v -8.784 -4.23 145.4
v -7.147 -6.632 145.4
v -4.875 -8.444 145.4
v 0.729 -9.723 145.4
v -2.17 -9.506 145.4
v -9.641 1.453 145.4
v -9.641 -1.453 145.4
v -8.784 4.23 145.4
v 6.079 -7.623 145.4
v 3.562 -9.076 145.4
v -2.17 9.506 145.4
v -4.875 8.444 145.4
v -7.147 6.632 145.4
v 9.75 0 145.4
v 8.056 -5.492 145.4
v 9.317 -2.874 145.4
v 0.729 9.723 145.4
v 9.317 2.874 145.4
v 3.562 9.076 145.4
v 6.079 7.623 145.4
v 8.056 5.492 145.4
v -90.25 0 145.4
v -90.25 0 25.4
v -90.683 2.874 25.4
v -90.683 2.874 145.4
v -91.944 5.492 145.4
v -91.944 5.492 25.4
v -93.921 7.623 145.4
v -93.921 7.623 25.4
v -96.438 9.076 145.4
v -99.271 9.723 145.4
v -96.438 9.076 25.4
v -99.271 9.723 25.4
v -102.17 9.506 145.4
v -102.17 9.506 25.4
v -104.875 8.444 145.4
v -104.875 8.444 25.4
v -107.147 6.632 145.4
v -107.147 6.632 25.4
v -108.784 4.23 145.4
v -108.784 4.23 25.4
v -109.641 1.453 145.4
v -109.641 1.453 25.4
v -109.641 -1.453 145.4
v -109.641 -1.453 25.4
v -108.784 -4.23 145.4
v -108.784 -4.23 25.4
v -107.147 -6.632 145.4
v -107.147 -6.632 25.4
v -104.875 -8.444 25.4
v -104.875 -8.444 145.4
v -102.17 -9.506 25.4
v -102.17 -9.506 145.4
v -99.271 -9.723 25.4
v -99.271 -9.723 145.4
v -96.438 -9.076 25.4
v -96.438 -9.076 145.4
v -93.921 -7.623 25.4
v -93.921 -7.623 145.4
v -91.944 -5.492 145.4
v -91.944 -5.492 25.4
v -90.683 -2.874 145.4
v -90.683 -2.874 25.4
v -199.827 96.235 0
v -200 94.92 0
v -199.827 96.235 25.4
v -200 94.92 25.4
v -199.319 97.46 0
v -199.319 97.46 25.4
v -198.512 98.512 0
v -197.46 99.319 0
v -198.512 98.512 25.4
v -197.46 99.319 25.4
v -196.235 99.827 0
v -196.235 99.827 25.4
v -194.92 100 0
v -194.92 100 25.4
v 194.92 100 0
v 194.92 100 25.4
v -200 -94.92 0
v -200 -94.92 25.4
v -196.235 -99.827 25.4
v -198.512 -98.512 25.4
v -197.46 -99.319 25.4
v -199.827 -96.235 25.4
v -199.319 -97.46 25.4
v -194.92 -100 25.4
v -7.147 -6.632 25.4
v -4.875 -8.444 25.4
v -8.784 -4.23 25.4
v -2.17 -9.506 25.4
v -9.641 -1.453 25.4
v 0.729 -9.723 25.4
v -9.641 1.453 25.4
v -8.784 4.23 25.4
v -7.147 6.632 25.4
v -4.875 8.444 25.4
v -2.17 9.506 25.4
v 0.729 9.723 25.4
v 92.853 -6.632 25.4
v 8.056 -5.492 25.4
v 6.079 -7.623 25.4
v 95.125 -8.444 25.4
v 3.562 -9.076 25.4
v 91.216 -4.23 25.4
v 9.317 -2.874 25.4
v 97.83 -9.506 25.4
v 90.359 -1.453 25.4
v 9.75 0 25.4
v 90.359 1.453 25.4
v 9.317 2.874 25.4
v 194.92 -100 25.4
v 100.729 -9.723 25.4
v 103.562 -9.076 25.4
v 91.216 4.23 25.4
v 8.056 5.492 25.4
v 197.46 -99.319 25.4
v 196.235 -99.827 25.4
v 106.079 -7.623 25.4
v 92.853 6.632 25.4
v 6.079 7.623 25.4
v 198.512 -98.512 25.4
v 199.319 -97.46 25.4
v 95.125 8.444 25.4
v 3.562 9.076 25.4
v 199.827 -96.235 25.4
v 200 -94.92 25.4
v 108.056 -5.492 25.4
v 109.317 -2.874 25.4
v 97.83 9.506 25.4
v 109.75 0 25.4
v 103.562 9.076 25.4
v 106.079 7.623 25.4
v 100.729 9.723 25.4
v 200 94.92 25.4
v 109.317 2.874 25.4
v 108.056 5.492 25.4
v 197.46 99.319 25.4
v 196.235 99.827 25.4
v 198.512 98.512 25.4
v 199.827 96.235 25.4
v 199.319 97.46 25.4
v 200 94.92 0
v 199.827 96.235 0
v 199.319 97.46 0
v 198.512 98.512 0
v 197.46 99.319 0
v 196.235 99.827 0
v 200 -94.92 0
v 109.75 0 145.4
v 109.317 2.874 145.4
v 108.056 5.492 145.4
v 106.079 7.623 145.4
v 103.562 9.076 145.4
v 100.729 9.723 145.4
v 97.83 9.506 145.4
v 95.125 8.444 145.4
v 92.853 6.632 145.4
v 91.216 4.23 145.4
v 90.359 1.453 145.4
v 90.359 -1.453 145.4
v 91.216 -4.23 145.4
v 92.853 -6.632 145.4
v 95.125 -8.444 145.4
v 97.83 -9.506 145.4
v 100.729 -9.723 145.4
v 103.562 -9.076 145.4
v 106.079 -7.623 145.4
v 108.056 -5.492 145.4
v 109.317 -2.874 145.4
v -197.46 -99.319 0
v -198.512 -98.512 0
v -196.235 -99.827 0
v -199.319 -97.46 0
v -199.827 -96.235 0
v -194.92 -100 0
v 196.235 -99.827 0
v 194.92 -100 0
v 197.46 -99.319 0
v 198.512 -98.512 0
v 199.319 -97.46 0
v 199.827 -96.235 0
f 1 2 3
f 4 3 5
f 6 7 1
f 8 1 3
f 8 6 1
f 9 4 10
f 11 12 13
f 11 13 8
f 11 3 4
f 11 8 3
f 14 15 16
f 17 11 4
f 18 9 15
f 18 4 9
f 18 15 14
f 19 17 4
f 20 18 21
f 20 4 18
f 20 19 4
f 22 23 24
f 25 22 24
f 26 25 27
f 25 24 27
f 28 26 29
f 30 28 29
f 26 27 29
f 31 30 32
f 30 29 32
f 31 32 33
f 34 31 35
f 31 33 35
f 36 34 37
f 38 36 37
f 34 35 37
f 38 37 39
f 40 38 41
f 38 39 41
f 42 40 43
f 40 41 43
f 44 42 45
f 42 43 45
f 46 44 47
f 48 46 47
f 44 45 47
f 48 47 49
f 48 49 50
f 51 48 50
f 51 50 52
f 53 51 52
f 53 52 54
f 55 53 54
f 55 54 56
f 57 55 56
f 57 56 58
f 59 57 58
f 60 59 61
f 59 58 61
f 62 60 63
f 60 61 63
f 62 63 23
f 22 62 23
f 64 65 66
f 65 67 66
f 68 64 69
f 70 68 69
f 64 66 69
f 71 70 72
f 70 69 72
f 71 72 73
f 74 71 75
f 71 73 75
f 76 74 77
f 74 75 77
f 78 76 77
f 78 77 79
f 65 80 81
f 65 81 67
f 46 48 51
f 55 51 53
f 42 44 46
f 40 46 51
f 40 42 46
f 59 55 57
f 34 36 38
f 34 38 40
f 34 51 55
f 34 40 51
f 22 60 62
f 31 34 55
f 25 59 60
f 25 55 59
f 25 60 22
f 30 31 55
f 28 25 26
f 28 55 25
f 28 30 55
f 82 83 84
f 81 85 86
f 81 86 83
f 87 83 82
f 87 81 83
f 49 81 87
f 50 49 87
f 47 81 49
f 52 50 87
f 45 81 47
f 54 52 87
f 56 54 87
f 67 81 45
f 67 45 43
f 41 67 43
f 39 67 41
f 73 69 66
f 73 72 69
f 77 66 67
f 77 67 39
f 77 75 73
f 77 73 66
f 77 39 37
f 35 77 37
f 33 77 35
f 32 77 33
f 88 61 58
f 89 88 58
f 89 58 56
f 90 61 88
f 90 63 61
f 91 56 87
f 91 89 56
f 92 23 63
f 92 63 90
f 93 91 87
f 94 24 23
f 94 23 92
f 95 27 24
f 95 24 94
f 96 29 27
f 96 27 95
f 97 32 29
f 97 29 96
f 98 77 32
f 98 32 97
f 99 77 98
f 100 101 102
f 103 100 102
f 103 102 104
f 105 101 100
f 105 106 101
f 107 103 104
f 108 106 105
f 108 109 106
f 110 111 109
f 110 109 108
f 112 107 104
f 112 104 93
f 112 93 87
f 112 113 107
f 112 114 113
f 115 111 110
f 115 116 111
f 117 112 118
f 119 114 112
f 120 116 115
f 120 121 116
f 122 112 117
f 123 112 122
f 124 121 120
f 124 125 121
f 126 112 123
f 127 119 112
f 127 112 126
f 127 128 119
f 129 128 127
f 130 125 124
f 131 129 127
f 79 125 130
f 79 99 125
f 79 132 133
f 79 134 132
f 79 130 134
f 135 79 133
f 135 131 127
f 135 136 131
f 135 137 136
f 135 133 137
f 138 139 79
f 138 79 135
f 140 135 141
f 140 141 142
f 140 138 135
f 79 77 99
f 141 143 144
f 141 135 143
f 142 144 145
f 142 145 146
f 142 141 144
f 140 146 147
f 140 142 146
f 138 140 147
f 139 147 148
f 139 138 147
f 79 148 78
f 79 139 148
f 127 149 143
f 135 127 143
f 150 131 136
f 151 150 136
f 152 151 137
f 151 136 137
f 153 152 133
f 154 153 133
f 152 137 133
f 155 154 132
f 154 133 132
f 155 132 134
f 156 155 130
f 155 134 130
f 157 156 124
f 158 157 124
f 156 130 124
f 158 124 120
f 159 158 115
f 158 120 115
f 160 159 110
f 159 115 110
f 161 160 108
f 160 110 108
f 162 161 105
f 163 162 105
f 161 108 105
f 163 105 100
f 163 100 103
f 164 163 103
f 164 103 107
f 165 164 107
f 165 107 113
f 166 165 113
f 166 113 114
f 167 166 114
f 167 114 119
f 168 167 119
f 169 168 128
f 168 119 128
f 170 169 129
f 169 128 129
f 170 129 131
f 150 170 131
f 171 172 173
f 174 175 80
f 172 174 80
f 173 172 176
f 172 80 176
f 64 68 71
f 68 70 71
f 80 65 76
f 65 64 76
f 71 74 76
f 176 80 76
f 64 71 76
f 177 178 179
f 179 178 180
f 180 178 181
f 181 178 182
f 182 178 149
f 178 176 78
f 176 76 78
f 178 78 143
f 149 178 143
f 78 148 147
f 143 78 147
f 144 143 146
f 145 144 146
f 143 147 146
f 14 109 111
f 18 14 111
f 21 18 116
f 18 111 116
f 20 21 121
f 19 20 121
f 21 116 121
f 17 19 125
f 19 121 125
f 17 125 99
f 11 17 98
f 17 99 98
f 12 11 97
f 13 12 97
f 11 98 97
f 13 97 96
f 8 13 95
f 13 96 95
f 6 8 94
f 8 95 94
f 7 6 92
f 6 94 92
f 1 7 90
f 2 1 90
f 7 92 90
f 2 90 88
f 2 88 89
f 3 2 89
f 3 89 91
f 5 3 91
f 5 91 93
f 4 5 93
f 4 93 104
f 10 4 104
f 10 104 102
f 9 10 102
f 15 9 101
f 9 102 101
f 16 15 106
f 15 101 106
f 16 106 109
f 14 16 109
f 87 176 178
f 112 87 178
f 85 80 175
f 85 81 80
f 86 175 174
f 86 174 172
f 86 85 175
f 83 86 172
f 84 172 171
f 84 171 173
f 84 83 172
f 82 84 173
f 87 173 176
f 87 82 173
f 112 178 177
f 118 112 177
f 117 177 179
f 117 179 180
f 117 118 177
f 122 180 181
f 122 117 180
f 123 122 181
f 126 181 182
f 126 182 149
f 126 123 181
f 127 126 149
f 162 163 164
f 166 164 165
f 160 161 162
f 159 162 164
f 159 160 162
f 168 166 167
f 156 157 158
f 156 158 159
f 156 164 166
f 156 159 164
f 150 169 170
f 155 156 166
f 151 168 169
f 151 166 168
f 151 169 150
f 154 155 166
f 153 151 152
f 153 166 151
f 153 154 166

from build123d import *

# Parameters (mm, degrees)
F0_W     = 400
F0_H     = 200
F1_DEPTH = 25.4
F2_R     = 5.08
F3_R     = 9.75
F4_DEPTH = 120


with BuildPart() as f1:
    # F0 (on Top) → F1 (new body)
    with BuildSketch(Plane.XY):
        Rectangle(F0_W, F0_H)
    extrude(amount=F1_DEPTH)

    # F2
    f2_edges = [f1.edges().sort_by_distance(p)[0] for p in [
        (200, 100, 12.7),
        (200, -100, 12.7),
        (-200, 100, 12.7),
        (-200, -100, 12.7),
    ]]
    fillet(f2_edges, radius=F2_R)

    # F3 (on face) → F4 (join)
    with BuildSketch(Plane.XY.offset(25.4)):
        with Locations((-100, 0)):
            Circle(F3_R)
        Circle(F3_R)
        with Locations((100, 0)):
            Circle(F3_R)
    extrude(amount=F4_DEPTH)


solid = f1.part
